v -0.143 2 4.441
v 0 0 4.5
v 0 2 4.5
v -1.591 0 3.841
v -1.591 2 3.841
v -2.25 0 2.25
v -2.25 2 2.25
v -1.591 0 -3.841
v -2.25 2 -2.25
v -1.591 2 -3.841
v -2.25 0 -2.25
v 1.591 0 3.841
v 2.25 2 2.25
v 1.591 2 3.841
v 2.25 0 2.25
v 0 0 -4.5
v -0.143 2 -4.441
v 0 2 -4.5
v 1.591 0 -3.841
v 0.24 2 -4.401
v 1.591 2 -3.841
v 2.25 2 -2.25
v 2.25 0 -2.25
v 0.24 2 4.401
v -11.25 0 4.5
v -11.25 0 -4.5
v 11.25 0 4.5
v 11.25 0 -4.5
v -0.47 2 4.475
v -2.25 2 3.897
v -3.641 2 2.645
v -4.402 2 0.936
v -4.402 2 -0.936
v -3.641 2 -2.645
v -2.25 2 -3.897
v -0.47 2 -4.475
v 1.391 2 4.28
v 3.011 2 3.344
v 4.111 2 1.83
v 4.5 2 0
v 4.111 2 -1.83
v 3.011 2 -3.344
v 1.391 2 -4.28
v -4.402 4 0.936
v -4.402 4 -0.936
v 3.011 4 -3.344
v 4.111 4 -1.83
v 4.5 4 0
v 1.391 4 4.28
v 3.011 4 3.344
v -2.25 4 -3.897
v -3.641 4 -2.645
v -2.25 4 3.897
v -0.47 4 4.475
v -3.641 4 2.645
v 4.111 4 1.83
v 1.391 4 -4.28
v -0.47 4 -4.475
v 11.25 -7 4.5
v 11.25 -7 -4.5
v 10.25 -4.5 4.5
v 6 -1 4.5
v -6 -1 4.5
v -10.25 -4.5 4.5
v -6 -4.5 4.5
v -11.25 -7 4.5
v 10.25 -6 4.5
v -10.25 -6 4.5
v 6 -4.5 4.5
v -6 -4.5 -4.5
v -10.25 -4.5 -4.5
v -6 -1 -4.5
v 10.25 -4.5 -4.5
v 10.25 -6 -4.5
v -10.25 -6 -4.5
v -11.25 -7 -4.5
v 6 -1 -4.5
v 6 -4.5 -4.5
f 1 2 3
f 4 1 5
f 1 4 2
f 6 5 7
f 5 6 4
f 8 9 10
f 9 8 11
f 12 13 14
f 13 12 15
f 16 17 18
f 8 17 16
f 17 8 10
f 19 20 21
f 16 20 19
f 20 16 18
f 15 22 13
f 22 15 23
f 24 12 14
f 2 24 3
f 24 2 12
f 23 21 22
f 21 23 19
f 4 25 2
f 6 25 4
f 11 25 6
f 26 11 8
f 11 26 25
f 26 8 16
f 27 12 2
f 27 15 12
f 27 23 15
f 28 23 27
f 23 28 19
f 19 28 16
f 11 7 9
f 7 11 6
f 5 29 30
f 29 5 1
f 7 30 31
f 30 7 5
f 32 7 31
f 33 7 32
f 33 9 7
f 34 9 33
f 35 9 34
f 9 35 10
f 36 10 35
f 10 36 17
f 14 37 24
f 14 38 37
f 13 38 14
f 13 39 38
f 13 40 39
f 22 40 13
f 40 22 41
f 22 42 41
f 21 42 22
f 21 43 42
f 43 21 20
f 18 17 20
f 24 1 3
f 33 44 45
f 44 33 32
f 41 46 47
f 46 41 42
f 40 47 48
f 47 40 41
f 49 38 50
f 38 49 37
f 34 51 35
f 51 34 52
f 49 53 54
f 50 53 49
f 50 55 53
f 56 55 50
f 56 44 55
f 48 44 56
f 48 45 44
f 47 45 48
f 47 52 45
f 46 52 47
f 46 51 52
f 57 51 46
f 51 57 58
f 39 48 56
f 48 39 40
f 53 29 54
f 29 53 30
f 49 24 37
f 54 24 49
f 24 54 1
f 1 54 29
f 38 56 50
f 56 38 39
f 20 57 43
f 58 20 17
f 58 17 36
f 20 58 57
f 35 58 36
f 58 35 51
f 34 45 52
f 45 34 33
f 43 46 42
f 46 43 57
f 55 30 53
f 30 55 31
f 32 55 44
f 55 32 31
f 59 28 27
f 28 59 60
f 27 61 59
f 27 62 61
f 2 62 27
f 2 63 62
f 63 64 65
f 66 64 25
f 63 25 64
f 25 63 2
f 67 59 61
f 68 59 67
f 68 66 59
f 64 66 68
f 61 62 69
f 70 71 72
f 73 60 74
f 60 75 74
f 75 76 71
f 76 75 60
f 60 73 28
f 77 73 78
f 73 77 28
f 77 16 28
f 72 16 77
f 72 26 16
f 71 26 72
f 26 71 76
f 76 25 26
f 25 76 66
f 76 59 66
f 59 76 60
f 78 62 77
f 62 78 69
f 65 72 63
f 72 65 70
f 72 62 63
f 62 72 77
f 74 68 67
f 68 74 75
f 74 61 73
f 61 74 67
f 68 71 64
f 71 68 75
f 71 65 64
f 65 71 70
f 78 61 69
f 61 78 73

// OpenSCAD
// file: peg.scad
pegSlot = 5; // the small opening it slides into
pegD = 9;    // the large opening to put it into
pegH = 22;   // top of large opening to bottom of small opening

holeD = 3.75; // "screw" holes

holeSpacingX = 15;
holeSpacingY = 14.5; // yes, this is actually not a grid. go figure
pegSpacingX = 3 * holeSpacingX;
pegSpacingY = 4 * holeSpacingY;

module peg(t = 2, clearance = 2)
{
    D = pegD;
    d = 4.5;

    rotate([ -90, 0, 0 ])
    {
        hull()
        {
            translate([ 0, (D - d) / 2, 0 ]) cylinder(h = clearance, d = d);
            translate([ 0, -(D - d) / 2, 0 ]) cylinder(h = clearance, d = d);
        }
        translate([ 0, 0, clearance ]) cylinder(h = t, d = D);
    }
}

module pegs(n, t = 2, clearance = 2)
{
    pegSpacingX = 45;
    x0 = ((1 - n) * pegSpacingX) / 2;
    for (i = [0:(n - 1)])
    {
        translate([ x0 + i * pegSpacingX, 0, 0 ]) peg(t, clearance);
    }
}
// main file
include<peg.scad>;

l1 = 12;
l2 = 20.5;
y1 = 3.5;
y2 = 5;

t = 1;

peg();

translate([ 0, -y2/2-t, 0 ]) difference()
{
    cube([ l2 + 2 * t, y2 + 2 * t, pegD ], center = true);
    cube([ l1, y2, pegD + .02 ], center = true);
    translate([ 0, (y2 - y1) / 2 - y2 / 2, 0 ]) cube([ l2, y2 - y1, pegD + .02 ], center = true);
}
